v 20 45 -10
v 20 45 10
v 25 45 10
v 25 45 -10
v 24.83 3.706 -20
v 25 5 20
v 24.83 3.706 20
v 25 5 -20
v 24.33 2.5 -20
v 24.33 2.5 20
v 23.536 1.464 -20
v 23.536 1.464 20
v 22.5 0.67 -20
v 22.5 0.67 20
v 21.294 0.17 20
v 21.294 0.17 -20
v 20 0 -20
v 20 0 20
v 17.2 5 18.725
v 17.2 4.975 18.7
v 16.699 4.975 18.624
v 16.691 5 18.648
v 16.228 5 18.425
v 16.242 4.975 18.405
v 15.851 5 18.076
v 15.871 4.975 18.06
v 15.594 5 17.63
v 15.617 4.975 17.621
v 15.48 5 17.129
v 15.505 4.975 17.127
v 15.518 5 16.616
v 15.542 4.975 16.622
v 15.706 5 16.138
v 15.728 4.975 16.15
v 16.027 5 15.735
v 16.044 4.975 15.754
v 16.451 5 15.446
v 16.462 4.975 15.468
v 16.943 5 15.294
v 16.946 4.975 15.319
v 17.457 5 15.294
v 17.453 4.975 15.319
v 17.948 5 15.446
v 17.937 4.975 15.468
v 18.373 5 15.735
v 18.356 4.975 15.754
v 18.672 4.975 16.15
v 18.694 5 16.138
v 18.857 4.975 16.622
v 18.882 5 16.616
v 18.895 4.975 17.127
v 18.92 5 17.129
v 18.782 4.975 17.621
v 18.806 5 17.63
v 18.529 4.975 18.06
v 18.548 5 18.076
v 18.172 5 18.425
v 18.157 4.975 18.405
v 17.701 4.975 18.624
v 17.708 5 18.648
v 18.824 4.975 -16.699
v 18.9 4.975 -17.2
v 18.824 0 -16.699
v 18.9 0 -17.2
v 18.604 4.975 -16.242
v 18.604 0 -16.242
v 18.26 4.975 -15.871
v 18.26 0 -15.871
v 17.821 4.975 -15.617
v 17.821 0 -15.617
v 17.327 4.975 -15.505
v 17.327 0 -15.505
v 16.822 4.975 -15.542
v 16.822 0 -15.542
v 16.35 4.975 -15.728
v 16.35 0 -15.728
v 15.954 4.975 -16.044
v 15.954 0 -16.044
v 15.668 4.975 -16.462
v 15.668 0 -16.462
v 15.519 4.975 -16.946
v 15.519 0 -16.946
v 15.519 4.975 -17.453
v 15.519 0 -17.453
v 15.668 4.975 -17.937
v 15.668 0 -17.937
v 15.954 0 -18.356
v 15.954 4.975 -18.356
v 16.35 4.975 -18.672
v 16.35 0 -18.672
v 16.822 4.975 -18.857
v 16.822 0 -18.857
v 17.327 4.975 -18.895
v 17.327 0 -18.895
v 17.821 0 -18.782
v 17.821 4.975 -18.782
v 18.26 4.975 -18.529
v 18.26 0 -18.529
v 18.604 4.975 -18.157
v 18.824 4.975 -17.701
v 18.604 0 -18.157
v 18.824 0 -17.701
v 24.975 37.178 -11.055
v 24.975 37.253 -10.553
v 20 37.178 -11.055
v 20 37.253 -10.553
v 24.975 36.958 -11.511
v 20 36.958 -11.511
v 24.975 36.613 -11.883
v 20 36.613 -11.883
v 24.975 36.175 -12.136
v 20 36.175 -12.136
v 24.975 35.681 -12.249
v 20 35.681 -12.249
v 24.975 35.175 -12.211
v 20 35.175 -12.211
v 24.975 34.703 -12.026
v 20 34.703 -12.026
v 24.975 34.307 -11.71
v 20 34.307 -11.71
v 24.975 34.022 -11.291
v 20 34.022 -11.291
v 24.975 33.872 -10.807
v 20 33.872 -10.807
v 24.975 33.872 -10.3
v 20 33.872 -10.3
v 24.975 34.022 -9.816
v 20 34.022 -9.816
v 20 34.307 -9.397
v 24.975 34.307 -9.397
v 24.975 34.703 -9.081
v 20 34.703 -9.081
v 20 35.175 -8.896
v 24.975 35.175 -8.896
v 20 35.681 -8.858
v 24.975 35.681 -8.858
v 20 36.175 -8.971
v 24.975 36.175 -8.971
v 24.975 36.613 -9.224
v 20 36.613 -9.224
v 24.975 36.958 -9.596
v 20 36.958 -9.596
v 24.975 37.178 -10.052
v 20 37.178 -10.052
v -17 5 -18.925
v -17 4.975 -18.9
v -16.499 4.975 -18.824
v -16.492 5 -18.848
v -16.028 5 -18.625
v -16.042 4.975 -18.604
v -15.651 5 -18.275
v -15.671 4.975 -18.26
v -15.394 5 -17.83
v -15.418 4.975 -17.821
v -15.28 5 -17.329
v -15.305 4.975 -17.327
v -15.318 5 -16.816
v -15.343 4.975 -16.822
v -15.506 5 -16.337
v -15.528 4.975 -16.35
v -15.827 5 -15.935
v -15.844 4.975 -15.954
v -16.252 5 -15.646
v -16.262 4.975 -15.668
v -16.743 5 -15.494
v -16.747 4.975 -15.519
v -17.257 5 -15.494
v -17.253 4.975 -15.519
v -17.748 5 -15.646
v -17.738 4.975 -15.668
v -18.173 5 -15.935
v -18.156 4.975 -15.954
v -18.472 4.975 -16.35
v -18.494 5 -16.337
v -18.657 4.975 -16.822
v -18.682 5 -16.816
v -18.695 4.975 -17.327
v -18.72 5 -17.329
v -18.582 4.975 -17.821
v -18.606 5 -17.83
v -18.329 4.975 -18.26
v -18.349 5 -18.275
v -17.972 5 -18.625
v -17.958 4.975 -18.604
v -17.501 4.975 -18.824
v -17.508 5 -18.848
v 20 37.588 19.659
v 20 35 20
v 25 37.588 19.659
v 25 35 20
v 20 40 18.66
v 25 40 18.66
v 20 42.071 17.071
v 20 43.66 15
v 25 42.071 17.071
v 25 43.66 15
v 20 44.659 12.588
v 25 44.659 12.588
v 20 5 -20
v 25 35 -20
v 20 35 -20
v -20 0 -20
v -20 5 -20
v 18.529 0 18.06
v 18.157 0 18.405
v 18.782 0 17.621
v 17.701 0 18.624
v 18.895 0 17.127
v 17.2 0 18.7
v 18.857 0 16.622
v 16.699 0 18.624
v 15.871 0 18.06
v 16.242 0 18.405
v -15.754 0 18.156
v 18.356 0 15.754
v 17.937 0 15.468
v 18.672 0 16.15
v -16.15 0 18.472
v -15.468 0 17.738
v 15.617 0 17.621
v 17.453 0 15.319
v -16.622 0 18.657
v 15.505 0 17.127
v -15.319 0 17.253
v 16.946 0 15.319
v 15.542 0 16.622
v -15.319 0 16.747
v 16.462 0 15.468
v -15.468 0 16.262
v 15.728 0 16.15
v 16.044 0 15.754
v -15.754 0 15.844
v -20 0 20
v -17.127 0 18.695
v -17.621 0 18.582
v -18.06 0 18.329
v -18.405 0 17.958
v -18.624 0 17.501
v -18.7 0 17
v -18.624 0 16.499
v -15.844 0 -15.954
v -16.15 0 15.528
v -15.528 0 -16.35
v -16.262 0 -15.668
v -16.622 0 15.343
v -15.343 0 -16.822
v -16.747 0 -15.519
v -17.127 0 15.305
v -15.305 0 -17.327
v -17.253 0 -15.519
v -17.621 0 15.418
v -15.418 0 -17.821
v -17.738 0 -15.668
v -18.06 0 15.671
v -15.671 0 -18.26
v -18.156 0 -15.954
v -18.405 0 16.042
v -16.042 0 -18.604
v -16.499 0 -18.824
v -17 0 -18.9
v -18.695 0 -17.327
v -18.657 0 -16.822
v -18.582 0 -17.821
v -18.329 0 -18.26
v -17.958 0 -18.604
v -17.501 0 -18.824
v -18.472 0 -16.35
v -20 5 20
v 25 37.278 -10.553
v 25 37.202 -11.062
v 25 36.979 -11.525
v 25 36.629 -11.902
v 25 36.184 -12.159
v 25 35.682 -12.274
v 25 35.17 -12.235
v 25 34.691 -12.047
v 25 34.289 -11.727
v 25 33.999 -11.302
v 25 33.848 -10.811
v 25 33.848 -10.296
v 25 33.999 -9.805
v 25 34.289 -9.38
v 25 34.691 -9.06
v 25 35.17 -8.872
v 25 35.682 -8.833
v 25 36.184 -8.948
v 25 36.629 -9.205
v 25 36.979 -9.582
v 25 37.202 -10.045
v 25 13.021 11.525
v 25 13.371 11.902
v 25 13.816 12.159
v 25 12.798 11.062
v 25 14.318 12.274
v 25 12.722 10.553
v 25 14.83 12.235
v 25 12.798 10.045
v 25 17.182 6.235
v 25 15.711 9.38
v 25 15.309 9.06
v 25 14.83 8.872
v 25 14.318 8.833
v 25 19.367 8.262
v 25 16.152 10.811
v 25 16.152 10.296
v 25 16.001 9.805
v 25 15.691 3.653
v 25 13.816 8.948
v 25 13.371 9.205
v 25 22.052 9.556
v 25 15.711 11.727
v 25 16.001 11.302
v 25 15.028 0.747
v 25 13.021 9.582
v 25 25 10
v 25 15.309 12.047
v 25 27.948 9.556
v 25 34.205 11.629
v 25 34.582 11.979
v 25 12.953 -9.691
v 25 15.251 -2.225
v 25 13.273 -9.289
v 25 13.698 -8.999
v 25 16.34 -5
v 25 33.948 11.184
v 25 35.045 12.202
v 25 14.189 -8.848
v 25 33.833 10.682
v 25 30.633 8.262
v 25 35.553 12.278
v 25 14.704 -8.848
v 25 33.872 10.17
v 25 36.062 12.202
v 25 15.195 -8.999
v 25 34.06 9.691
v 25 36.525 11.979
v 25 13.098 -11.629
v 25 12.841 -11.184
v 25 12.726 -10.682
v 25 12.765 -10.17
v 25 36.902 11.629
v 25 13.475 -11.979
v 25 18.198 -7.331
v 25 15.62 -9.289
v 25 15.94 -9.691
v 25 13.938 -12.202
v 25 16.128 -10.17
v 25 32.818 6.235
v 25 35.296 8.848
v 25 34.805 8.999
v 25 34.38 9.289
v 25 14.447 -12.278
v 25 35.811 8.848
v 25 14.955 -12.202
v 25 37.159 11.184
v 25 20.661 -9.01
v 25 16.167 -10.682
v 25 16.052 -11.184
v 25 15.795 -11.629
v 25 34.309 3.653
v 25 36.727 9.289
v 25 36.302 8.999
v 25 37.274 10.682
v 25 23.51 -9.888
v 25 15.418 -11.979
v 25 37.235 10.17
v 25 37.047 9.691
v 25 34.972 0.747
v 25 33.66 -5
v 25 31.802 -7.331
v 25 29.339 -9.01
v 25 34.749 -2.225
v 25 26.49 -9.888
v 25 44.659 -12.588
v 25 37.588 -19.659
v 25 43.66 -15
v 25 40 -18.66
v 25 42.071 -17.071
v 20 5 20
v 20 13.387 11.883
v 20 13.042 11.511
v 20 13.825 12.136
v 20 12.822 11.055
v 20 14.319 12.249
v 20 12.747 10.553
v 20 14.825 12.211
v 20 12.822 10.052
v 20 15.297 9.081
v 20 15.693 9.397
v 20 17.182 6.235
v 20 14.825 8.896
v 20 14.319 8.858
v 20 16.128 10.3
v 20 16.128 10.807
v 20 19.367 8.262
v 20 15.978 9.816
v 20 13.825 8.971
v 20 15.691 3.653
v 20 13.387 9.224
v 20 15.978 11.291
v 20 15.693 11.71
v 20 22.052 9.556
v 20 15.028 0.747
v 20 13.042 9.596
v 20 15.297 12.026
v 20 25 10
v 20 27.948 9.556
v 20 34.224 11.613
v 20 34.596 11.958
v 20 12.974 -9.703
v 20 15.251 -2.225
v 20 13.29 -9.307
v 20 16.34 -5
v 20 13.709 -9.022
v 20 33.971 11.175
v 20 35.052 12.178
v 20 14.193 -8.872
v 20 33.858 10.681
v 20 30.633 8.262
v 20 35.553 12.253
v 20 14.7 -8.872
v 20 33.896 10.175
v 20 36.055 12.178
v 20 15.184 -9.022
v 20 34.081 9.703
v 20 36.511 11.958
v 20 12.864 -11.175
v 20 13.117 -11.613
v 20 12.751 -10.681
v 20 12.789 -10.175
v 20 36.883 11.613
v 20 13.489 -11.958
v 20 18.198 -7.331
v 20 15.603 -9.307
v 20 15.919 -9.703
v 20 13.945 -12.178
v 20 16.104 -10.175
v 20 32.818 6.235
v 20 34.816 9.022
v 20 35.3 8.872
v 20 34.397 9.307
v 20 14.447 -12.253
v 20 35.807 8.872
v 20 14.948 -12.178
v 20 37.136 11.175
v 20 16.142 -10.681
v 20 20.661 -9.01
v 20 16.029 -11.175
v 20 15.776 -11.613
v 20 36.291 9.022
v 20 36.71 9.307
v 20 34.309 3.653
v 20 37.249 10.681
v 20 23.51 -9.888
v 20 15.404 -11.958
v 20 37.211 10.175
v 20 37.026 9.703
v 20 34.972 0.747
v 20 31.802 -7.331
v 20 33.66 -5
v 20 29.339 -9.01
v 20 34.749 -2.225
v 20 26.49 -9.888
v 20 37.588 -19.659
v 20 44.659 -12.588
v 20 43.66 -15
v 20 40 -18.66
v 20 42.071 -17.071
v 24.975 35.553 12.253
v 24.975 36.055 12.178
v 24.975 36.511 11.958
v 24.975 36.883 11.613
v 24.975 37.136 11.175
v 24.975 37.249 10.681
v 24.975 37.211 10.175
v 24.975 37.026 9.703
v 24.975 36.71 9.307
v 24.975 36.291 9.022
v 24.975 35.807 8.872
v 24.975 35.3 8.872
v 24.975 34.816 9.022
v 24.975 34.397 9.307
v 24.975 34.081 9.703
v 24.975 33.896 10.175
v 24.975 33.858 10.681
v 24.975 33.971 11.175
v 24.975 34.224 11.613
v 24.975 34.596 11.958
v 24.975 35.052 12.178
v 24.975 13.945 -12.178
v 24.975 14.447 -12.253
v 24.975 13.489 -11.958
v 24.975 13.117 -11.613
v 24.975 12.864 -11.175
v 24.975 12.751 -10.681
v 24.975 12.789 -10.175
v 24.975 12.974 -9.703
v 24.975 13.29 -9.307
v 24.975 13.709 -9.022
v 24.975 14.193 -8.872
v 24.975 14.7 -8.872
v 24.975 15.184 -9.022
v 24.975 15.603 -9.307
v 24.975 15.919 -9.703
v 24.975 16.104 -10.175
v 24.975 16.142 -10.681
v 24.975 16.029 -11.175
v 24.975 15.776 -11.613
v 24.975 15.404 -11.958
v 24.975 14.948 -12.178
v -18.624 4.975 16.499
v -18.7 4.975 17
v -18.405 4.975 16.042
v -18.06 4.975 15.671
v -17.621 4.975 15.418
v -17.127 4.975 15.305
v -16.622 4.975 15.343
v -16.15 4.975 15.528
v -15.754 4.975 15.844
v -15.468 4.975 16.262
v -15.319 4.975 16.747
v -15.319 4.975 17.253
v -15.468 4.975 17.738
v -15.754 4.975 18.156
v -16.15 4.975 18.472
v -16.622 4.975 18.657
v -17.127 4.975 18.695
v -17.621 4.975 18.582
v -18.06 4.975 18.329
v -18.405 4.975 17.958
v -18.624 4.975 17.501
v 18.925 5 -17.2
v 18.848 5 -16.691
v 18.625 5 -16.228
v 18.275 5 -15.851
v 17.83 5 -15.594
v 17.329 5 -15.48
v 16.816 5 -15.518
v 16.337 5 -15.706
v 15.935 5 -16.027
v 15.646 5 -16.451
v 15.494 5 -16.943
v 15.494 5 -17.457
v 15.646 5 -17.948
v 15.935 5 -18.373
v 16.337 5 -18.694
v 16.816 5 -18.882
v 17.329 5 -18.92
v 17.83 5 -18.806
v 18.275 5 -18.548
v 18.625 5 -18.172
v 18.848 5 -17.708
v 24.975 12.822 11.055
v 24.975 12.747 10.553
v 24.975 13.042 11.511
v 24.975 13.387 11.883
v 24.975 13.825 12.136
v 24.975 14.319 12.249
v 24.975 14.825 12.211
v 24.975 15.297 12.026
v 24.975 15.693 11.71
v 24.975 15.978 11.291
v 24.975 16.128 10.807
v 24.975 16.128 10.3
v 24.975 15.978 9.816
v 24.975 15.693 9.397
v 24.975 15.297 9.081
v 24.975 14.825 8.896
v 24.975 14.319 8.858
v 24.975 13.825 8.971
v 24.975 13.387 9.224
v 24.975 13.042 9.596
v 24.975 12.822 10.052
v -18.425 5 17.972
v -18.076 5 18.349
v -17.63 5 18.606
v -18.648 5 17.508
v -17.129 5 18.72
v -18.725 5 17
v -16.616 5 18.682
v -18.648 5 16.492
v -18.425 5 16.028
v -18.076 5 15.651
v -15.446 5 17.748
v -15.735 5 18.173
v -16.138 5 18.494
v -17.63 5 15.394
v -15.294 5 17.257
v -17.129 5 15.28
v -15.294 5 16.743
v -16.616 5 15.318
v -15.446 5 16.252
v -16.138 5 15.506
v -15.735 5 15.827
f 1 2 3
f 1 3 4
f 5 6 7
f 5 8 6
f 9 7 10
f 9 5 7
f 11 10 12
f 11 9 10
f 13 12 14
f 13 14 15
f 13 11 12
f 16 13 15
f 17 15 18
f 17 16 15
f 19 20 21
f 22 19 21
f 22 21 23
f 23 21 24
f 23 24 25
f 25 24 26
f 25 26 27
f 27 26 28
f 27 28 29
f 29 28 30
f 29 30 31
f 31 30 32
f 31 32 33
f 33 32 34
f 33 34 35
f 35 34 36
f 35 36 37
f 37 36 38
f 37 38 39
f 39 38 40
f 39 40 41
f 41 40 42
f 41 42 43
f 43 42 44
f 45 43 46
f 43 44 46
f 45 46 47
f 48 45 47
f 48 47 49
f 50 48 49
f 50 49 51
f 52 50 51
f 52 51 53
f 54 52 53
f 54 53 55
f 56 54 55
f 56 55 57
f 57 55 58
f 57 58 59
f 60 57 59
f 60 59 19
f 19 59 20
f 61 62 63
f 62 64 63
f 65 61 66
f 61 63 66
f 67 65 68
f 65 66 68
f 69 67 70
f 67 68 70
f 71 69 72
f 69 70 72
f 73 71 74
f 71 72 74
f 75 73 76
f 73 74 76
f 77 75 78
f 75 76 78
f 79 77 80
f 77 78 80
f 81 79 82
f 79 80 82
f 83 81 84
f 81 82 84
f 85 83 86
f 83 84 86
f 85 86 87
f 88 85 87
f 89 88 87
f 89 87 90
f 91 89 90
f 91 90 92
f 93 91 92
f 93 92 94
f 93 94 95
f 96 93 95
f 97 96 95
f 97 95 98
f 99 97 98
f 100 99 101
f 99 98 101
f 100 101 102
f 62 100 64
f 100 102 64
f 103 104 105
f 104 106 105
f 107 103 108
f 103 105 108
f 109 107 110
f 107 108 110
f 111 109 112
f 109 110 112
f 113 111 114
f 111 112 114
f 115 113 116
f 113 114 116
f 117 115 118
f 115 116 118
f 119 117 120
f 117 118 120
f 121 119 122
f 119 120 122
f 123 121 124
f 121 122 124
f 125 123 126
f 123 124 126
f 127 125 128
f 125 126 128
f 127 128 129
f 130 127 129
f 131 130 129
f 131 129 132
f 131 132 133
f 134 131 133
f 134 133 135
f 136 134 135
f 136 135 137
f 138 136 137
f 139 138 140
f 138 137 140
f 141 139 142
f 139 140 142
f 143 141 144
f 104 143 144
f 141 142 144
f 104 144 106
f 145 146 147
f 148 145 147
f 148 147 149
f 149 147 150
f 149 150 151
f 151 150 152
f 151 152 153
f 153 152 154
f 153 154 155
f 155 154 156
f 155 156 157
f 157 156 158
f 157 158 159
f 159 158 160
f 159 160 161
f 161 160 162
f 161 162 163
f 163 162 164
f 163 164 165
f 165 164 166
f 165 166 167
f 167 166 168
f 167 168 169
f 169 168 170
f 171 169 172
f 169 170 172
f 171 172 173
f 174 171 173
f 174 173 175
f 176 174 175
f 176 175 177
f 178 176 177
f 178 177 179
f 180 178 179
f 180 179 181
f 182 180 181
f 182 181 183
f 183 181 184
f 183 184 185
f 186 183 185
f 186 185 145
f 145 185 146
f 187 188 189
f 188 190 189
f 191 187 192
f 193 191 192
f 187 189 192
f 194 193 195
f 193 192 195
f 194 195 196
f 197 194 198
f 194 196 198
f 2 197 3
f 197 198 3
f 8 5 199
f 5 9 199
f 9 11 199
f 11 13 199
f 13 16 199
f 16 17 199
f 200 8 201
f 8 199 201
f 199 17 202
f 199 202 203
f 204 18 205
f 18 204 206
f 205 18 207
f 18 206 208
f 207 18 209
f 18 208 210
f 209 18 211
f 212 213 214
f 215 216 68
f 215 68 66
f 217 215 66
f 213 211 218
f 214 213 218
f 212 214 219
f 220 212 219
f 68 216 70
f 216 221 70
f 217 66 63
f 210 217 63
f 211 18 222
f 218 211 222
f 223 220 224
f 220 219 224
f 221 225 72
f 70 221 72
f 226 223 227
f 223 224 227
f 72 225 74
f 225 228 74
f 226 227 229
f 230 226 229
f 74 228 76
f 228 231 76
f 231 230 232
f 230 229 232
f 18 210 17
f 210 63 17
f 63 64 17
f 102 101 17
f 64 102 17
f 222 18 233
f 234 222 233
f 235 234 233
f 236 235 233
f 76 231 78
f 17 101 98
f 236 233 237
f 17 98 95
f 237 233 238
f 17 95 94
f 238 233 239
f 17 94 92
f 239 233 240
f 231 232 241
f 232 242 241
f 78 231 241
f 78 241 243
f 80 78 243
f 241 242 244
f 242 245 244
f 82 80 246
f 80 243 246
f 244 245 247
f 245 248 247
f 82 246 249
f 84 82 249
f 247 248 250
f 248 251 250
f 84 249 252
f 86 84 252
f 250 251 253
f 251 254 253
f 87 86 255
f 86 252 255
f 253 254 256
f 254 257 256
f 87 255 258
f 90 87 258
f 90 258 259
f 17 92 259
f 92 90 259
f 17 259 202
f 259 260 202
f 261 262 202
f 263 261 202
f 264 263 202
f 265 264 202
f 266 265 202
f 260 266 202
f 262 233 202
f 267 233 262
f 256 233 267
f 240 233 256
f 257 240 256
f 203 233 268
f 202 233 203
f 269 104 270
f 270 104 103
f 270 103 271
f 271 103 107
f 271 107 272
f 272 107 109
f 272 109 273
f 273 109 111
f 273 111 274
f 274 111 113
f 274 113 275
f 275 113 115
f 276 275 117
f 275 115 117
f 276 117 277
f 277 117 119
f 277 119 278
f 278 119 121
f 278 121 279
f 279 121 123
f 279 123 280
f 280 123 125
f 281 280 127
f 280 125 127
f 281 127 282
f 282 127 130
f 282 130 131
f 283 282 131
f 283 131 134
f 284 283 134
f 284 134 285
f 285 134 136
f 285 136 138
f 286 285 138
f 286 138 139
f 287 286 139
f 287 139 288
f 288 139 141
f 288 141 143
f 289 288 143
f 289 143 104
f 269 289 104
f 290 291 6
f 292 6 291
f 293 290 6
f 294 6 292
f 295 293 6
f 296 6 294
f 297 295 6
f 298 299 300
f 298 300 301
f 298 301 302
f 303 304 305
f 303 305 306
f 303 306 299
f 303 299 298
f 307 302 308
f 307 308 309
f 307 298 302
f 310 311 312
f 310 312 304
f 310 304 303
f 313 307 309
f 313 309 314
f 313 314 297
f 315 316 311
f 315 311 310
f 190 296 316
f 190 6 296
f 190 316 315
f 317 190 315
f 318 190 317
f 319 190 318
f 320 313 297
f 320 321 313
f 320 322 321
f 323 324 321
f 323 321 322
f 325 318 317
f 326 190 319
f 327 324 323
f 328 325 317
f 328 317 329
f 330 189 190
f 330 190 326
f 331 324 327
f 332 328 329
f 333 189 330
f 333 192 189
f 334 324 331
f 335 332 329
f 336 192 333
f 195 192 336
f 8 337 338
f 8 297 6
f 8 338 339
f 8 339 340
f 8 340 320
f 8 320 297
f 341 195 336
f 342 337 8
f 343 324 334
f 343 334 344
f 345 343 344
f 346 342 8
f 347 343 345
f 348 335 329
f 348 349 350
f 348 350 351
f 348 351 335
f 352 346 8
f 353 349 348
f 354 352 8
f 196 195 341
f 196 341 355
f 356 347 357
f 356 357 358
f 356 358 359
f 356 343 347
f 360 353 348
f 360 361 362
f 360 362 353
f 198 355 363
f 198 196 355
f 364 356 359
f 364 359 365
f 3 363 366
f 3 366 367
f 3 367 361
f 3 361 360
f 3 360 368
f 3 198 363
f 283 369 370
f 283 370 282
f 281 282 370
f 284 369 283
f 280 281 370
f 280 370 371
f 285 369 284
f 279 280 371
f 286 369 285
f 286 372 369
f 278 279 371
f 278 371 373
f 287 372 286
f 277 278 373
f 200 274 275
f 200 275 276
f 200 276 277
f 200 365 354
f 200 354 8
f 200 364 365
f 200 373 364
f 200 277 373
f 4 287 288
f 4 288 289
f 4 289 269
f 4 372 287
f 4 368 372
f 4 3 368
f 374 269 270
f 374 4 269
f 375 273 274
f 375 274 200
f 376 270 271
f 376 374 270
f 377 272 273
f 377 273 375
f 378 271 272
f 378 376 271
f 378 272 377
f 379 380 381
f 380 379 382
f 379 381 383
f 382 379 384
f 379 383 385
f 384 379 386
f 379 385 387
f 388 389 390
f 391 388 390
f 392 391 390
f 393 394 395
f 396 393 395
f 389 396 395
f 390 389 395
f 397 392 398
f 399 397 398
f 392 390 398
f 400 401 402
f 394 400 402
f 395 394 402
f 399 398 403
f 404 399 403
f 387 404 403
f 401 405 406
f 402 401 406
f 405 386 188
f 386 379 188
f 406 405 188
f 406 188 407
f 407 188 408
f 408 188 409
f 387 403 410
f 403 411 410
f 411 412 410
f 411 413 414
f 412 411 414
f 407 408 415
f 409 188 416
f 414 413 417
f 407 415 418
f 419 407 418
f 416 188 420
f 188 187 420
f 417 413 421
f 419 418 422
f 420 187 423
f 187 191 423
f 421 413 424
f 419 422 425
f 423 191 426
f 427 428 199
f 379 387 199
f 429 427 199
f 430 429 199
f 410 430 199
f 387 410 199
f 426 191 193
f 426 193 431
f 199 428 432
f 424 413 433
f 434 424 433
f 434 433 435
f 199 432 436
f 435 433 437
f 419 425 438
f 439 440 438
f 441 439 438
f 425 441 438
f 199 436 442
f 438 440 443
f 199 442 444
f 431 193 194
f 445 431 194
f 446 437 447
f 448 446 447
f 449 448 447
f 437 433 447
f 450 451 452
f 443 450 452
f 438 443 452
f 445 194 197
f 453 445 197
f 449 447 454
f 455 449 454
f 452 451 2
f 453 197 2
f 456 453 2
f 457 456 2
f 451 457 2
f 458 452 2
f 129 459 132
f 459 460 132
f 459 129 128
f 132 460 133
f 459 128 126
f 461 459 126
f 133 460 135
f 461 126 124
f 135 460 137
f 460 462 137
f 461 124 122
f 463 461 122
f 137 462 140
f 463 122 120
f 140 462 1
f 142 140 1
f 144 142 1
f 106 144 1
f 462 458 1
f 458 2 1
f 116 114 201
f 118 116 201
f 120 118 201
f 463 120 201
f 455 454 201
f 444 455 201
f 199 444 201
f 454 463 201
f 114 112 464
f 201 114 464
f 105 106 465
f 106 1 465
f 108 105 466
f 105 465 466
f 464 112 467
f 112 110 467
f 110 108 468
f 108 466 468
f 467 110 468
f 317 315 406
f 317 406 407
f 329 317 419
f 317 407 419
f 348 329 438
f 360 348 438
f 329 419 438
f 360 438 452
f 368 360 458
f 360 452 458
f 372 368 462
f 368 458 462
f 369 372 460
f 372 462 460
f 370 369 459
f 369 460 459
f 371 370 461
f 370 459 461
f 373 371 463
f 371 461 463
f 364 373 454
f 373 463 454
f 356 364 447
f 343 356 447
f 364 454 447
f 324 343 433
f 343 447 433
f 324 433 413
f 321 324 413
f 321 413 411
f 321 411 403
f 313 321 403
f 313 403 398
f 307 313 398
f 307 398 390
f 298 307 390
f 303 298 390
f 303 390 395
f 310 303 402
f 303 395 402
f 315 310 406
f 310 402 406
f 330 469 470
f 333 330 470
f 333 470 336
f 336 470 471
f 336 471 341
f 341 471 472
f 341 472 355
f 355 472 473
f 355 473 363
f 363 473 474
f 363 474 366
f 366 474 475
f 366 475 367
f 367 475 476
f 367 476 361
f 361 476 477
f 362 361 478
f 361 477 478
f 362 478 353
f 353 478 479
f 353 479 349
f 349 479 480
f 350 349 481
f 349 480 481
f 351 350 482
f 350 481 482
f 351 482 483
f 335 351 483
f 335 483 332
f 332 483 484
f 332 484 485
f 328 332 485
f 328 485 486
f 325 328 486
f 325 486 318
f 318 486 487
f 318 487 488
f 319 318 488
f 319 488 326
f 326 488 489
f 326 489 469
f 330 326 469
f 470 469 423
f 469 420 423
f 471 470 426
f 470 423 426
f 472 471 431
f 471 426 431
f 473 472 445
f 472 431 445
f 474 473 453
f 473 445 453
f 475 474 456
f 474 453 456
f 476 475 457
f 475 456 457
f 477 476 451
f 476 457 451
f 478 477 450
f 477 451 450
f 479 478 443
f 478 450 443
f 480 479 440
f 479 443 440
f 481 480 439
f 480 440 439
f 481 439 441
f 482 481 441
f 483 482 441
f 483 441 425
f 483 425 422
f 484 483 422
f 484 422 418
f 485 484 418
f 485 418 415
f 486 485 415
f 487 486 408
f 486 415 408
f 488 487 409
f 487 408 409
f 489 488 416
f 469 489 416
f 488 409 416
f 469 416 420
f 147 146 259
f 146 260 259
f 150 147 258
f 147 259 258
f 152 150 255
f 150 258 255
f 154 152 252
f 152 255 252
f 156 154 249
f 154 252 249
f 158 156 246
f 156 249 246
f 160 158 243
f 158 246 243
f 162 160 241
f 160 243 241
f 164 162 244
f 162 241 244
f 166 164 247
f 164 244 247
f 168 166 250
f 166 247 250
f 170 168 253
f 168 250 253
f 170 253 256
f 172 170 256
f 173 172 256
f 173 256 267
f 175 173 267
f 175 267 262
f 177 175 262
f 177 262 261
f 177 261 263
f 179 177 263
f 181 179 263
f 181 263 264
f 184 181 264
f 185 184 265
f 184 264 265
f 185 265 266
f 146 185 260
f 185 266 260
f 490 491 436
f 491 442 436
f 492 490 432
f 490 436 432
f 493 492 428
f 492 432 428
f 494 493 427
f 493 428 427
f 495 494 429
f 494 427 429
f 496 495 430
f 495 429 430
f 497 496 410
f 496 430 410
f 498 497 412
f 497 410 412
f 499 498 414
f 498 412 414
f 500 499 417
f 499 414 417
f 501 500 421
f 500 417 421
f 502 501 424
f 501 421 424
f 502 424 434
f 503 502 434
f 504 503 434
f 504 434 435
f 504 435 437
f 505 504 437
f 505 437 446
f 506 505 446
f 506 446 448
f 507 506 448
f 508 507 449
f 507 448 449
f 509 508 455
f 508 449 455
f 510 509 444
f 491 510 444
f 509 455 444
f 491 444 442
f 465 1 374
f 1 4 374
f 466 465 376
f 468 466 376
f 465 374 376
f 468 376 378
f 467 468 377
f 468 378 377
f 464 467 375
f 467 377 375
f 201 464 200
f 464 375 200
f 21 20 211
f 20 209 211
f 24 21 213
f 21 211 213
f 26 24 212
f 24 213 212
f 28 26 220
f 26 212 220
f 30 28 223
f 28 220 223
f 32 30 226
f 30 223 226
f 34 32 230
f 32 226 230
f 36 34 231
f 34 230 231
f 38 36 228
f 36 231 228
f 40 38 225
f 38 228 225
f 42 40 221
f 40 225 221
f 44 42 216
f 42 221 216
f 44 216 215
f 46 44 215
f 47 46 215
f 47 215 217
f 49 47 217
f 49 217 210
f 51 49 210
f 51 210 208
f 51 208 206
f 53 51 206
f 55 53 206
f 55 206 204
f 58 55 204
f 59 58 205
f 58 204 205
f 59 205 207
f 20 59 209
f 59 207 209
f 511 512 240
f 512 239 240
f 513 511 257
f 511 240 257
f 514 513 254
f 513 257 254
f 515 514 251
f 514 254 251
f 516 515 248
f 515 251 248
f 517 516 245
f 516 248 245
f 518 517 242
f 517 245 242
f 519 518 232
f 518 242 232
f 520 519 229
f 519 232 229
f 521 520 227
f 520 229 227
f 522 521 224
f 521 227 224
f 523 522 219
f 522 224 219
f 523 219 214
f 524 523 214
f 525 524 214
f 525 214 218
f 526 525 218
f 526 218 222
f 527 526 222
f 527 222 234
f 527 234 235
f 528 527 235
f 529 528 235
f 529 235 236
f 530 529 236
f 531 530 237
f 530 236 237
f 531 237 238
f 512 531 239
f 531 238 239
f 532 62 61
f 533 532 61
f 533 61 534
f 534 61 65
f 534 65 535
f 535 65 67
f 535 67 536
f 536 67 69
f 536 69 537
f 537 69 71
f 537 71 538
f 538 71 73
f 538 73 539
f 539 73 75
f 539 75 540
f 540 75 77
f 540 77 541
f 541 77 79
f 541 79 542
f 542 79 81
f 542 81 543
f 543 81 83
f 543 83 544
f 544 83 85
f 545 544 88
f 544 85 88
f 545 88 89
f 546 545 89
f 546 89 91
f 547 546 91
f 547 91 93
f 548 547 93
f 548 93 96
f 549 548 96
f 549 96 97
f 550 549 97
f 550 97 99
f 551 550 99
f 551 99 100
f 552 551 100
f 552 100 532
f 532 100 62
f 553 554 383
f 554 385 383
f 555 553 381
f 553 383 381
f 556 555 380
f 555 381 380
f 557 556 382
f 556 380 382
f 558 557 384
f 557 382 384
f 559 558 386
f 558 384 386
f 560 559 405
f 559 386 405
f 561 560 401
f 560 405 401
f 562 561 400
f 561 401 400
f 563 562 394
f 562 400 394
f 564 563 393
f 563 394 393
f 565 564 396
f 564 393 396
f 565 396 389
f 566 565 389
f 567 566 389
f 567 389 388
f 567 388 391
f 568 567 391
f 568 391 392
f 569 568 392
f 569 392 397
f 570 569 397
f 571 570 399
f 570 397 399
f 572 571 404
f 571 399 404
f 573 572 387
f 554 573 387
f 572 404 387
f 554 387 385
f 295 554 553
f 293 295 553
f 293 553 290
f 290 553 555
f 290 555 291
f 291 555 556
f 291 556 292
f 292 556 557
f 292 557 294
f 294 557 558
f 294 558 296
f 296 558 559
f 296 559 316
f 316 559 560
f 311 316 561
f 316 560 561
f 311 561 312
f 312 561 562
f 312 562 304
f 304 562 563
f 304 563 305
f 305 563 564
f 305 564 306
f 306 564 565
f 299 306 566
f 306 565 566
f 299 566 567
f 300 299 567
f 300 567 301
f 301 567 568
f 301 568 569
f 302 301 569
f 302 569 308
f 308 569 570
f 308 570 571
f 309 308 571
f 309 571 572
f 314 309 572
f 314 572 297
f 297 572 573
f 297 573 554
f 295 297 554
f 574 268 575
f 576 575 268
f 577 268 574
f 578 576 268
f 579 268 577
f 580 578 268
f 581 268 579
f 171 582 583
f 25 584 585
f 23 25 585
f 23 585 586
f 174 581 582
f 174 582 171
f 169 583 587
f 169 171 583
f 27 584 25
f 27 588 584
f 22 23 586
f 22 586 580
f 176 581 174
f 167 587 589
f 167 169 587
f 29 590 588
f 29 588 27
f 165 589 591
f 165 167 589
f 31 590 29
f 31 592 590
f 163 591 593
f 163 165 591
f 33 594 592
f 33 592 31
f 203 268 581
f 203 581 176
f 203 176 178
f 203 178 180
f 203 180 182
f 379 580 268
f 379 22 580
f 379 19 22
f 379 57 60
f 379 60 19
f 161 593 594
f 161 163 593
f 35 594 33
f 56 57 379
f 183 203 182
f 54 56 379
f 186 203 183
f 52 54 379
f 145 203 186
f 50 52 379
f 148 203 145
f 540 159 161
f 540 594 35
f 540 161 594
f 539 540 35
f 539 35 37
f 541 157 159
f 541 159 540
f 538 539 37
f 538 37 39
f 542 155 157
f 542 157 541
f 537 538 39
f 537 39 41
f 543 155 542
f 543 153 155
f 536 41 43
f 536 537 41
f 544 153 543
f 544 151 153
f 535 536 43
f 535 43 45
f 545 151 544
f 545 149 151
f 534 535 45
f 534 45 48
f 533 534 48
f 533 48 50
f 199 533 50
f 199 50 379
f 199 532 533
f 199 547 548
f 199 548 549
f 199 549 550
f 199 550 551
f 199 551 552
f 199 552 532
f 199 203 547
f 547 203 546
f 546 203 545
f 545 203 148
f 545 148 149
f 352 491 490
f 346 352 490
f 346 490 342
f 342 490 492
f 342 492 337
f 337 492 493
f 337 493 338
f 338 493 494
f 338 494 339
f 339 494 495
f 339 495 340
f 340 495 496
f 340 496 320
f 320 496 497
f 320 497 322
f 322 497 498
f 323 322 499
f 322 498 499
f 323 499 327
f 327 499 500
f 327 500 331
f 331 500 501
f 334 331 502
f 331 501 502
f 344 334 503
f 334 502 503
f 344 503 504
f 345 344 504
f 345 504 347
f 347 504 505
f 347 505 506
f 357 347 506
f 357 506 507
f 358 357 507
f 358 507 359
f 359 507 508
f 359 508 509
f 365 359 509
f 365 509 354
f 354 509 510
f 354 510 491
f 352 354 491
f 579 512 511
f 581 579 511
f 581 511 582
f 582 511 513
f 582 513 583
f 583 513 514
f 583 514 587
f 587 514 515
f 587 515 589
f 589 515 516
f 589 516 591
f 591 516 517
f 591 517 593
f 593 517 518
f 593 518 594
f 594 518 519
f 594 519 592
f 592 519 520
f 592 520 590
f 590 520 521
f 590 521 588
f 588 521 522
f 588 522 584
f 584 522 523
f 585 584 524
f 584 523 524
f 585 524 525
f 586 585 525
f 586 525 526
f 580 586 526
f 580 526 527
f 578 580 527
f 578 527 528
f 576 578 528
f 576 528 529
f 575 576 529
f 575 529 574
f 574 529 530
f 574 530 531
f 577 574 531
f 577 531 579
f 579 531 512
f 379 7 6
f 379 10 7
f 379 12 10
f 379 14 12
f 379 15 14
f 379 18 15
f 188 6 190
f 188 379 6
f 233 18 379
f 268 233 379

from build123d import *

# Parameters (mm, degrees)
SKETCH1_W                      = 40
SKETCH1_H                      = 40
BOSS_EXTRUDE1_DEPTH            = 5
BOSS_EXTRUDE2_START            = 20
SKETCH2_W                      = 40
SKETCH2_H                      = 45
BOSS_EXTRUDE2_DEPTH            = 5
FILLET1_R                      = 10
FILLET2_R                      = 10
FILLET3_R                      = 5
SKETCH3_R                      = 10
CUT_EXTRUDE1_DEPTH             = 5
M3_CLEARANCE_HOLE1_D           = 3.4
M3_CLEARANCE_HOLE1_CSINK_D     = 3.45
M3_CLEARANCE_HOLE1_CSINK_ANGLE = 90
CIRPATTERN1_COUNT              = 4
M3_CLEARANCE_HOLE2_D           = 3.4
M3_CLEARANCE_HOLE2_CSINK_D     = 3.45
M3_CLEARANCE_HOLE2_CSINK_ANGLE = 90
CIRPATTERN2_COUNT              = 4


with BuildPart() as part:
    # Sketch1 → Boss-Extrude1 (new body)
    with BuildSketch(Plane(origin=(0, 0, 0), x_dir=(1, 0, 0), z_dir=(0, 1, 0))):
        Rectangle(SKETCH1_W, SKETCH1_H)
    extrude(amount=BOSS_EXTRUDE1_DEPTH)

    # Sketch2 → Boss-Extrude2 (add)
    with BuildSketch(Plane(origin=(0, 0, 0), x_dir=(0, 0, -1), z_dir=(1, 0, 0)).offset(BOSS_EXTRUDE2_START)):
        with Locations((0, 22.5)):
            Rectangle(SKETCH2_W, SKETCH2_H)
    extrude(amount=BOSS_EXTRUDE2_DEPTH)

    # Fillet1
    fillet1_edges = [part.edges().sort_by_distance(p)[0] for p in [
        (22.5, 45, 20),
    ]]
    fillet(fillet1_edges, radius=FILLET1_R)

    # Fillet2
    fillet2_edges = [part.edges().sort_by_distance(p)[0] for p in [
        (22.5, 45, -20),
    ]]
    fillet(fillet2_edges, radius=FILLET2_R)

    # Fillet3
    fillet3_edges = [part.edges().sort_by_distance(p)[0] for p in [
        (25, 0, 0),
    ]]
    fillet(fillet3_edges, radius=FILLET3_R)

    # Sketch3 → Cut-Extrude1 (cut)
    with BuildSketch(Plane.ZY.offset(-20)):
        with Locations((0, 25)):
            Circle(SKETCH3_R)
    extrude(amount=-CUT_EXTRUDE1_DEPTH, mode=Mode.SUBTRACT)

    # M3 Clearance Hole1 (through all)
    with Locations(Plane(origin=(25, 0, 0), x_dir=(0, 0, -1), z_dir=(1, 0, 0))):
        with Locations((-10.553493254, 35.553493254)):
            m3_clearance_hole1 = CounterSinkHole(M3_CLEARANCE_HOLE1_D / 2, M3_CLEARANCE_HOLE1_CSINK_D / 2, counter_sink_angle=M3_CLEARANCE_HOLE1_CSINK_ANGLE)

    # CirPattern1: M3 Clearance Hole1 ×4 about axis
    cirpattern1_axis = Axis((0, 25, 0), (1, 0, 0))
    for i in range(1, CIRPATTERN1_COUNT):
        add(m3_clearance_hole1.rotate(cirpattern1_axis, i * 360 / CIRPATTERN1_COUNT), mode=Mode.SUBTRACT)

    # M3 Clearance Hole2 (through all)
    with Locations(Plane(origin=(0, 5, 0), x_dir=(1, 0, 0), z_dir=(0, 1, 0))):
        with Locations((-17, -17)):
            m3_clearance_hole2 = CounterSinkHole(M3_CLEARANCE_HOLE2_D / 2, M3_CLEARANCE_HOLE2_CSINK_D / 2, counter_sink_angle=M3_CLEARANCE_HOLE2_CSINK_ANGLE)

    # CirPattern2: M3 Clearance Hole2 ×4 about axis
    cirpattern2_axis = Axis((0.09990837, 0, -0.09990837), (0, 1, 0))
    for i in range(1, CIRPATTERN2_COUNT):
        add(m3_clearance_hole2.rotate(cirpattern2_axis, i * 360 / CIRPATTERN2_COUNT), mode=Mode.SUBTRACT)


solid = part.part
